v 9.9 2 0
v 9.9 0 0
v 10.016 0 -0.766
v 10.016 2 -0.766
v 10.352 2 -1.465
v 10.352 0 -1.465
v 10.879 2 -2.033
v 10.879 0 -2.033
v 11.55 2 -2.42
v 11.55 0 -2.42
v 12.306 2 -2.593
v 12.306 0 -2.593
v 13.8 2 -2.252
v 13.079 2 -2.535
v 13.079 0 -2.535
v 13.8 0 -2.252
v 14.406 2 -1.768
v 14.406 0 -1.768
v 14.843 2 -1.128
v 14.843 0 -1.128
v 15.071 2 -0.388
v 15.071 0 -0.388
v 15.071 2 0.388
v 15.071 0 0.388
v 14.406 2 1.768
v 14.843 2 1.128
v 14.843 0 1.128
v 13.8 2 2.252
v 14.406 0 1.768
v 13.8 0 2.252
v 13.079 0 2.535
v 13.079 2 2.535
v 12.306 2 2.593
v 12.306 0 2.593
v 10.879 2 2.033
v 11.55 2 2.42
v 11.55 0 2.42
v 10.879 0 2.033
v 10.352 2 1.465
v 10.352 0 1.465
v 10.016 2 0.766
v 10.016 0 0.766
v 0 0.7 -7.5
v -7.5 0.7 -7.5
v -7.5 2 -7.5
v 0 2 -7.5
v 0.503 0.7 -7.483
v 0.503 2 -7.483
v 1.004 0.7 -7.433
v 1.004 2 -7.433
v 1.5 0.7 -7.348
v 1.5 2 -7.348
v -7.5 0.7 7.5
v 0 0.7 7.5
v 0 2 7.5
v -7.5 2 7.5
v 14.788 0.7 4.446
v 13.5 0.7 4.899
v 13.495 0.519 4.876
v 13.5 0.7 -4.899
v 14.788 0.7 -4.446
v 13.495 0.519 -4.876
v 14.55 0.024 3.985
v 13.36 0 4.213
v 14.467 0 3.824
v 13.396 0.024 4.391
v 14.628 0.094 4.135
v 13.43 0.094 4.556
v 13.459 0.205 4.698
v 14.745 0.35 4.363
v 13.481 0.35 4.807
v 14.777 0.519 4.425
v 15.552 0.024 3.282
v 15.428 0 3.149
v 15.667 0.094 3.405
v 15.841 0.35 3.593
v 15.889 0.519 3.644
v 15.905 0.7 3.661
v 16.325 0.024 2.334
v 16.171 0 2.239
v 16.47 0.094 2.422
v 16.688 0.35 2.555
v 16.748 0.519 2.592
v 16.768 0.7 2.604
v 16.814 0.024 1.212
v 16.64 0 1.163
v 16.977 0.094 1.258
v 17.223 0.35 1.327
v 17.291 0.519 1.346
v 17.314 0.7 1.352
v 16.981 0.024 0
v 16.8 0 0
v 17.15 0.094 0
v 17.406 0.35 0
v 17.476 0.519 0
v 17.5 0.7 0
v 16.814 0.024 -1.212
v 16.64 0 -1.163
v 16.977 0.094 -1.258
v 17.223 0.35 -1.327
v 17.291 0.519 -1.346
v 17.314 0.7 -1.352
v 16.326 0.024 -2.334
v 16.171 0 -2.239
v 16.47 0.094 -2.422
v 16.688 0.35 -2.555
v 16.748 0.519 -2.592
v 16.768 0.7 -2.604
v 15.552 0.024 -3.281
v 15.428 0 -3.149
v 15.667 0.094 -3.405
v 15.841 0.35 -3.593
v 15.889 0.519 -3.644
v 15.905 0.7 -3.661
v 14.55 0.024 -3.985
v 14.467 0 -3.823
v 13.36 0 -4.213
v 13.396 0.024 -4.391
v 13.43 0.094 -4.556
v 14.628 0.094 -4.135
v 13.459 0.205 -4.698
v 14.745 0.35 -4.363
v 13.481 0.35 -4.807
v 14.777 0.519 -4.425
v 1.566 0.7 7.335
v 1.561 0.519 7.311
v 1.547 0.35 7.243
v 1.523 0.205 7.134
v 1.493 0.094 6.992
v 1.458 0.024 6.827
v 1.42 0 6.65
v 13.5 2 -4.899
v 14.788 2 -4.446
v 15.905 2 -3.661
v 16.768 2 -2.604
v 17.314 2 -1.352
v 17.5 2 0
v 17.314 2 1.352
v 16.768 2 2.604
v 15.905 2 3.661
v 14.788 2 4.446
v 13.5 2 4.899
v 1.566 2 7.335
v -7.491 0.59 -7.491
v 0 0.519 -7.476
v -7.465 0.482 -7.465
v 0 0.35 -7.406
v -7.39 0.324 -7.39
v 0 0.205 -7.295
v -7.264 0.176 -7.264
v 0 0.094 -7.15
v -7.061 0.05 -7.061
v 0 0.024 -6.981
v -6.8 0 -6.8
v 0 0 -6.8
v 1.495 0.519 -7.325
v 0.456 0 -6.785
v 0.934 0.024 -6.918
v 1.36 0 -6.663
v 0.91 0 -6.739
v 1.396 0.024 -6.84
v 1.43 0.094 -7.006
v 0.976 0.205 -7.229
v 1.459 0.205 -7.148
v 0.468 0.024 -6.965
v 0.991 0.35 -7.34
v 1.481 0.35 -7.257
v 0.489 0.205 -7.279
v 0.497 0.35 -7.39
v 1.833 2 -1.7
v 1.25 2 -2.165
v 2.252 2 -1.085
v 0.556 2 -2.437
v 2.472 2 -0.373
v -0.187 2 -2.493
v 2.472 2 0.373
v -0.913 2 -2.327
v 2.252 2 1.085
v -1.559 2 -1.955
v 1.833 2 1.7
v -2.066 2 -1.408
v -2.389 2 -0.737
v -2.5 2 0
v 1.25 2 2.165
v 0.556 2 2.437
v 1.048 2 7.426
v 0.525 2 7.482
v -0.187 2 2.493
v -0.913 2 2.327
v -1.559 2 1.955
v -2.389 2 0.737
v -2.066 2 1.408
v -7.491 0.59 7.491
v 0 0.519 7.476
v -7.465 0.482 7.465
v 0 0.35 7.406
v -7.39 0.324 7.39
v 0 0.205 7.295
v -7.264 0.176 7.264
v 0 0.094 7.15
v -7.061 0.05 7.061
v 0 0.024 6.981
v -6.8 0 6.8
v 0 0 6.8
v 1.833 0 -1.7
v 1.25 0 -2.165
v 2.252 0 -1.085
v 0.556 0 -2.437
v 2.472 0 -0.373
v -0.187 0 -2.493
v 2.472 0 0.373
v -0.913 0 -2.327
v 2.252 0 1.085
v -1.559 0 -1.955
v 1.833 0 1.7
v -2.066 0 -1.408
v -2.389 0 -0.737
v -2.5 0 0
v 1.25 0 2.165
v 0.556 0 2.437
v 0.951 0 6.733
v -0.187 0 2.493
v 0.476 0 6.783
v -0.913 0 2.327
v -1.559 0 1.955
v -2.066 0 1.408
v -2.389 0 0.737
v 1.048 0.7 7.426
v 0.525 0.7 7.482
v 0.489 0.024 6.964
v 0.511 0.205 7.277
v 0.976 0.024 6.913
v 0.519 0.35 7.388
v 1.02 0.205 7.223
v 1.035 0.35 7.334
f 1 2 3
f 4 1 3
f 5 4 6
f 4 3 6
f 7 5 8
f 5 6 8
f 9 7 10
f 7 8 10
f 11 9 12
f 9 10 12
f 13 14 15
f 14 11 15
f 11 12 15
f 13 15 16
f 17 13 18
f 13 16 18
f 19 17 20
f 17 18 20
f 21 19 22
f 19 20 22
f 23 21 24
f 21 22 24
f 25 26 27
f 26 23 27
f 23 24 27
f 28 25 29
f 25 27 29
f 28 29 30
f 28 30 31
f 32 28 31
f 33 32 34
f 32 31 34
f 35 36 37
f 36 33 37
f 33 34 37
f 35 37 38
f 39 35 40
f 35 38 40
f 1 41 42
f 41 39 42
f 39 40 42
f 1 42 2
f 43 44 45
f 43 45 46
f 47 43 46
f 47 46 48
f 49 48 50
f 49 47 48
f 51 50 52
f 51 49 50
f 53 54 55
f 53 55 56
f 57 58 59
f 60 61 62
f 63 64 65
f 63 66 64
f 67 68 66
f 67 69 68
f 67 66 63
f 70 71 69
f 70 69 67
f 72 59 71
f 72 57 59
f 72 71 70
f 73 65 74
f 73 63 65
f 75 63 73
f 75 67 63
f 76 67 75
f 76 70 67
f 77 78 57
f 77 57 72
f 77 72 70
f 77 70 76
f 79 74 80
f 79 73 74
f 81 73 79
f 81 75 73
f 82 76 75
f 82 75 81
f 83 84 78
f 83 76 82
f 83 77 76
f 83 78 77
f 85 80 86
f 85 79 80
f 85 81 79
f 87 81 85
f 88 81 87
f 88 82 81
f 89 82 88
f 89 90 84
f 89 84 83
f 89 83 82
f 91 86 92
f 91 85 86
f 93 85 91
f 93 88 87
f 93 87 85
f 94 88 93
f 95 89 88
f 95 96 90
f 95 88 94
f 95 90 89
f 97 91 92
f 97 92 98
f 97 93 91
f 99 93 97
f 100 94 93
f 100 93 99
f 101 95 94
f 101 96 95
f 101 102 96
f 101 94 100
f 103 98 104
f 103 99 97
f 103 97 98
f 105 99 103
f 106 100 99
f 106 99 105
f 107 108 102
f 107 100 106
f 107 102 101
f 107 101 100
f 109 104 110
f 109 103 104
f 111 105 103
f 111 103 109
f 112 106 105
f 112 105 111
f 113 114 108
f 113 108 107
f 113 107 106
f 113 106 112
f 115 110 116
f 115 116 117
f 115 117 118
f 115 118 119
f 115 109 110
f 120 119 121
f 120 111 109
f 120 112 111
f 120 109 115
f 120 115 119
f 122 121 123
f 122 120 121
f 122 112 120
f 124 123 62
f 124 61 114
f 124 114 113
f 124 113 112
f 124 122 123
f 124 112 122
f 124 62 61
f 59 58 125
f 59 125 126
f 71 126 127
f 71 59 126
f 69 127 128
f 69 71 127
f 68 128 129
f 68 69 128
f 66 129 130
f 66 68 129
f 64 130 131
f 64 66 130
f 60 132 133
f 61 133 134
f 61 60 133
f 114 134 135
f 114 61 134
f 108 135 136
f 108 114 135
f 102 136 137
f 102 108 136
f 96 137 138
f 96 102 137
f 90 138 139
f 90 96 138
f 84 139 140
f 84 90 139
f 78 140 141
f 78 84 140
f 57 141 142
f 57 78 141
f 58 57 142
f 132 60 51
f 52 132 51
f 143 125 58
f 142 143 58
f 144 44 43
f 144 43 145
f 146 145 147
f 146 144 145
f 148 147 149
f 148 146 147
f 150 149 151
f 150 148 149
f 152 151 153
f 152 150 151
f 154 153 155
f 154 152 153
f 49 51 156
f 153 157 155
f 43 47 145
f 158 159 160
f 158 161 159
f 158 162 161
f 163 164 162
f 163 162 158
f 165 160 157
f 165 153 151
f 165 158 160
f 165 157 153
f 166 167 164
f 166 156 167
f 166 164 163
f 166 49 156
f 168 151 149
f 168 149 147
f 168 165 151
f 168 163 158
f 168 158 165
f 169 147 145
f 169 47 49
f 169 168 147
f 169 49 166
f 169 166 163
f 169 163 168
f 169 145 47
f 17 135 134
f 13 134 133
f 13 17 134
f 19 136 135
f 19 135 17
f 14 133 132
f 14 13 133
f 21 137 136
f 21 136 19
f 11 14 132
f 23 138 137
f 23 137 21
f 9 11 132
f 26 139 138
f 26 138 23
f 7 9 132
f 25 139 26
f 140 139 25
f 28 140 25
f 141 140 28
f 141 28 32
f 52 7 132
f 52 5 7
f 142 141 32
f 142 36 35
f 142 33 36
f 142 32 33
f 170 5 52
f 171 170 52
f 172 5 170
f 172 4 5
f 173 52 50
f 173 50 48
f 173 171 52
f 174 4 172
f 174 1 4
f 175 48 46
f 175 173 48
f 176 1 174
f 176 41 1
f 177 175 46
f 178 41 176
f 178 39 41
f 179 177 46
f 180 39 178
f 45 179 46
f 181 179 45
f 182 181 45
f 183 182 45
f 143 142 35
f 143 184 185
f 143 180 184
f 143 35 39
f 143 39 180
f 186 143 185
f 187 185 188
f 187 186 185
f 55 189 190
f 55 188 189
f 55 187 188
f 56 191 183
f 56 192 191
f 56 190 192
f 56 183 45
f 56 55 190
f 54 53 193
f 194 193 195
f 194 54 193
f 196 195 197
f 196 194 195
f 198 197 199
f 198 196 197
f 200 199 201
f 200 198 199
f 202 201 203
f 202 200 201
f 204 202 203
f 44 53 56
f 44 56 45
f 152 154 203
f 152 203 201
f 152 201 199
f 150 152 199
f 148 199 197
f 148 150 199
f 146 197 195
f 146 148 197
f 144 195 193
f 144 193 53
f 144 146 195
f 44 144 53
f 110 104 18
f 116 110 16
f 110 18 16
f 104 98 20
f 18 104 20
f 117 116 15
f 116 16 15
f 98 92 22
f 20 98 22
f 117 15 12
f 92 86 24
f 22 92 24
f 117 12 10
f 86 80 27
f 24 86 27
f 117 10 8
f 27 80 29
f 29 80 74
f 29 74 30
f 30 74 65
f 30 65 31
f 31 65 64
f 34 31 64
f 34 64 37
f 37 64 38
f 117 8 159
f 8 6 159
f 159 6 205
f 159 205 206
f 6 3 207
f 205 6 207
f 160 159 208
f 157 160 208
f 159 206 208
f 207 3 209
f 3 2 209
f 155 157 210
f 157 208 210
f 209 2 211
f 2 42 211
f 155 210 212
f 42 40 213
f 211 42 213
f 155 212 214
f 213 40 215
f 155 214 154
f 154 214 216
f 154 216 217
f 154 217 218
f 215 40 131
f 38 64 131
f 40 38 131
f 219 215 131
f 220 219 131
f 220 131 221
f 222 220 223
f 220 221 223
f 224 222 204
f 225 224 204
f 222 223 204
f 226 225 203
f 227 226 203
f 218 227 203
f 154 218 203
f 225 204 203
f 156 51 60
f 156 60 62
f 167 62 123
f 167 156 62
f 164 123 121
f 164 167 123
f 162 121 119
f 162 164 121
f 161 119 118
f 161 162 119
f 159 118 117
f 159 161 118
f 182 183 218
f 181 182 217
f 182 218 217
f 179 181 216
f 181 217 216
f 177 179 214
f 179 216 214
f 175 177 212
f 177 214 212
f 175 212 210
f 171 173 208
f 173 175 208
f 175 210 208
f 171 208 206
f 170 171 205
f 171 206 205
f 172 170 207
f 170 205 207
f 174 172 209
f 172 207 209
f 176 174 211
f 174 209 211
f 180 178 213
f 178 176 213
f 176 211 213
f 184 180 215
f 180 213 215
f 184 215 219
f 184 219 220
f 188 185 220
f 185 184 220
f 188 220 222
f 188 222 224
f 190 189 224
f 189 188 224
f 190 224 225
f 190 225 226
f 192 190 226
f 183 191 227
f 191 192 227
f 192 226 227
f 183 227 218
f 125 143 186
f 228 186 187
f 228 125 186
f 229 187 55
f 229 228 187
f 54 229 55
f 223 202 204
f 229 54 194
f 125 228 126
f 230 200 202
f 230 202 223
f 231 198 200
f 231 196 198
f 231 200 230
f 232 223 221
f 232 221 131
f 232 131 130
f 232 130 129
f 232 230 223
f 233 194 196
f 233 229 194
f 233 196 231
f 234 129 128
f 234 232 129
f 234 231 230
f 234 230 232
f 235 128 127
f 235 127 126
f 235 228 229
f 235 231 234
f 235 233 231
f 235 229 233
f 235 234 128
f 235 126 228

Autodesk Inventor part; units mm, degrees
ref_plane "YZ Plane" through (0, 0, 0) normal (1, 0, 0) x (0, 1, 0)
ref_plane "XZ Plane" through (0, 0, 0) normal (0, 1, 0) x (-1, 0, 0)
ref_plane "XY Plane" through (0, 0, 0) normal (0, 0, 1) x (1, 0, 0)
sketch "Эскиз1" plane through (0, 0, 0) normal (0, 1, 0) x (-1, 0, 0)
  circle A0 centre (0, 0) radius 2.5
  circle A1 centre (0, 0) radius 7.5
  line L0 (0, 7.5) -> (7.5, 7.5)
  line L1 (7.5, 7.5) -> (7.5, -7.5)
  line L2 (7.5, -7.5) -> (0, -7.5)
  line L3 (0, -7.5) -> (0, 7.5)
  line L4 (-7.5, 0) -> (-12.5, 0)
  circle A2 centre (-12.5, 0) radius 2.6
  circle A3 centre (-12.5, 0) radius 5
  line L5 (-1.5661, 7.3347) -> (-13.4999, 4.899)
  line L6 (-13.5, -4.899) -> (-1.5, -7.3485)
  dimension "d0" = 5
  dimension "d1" = 15
  dimension "d2" = 5
  dimension "d3" = 5.2
extrude "Выдавливание1" add sketch "Эскиз1" along normal blind 2 contours A0 L3 A1 | A0 L3 A1 | L0 L1 A1 | A1 L1 L2 | A1 A3 L5 | L6 A3 A1 | A3
fillet "Сопряжение1" radius 0.7 8 edges at (0.7874, 0, 7.4586) (-3.75, 0, 7.5) (-7.5, 0, 0) (0.7538, 0, -7.462) (7.5, 0, -6.1237) (17.5, 0, 0.0001) (7.533, 0, 6.1168) (-3.75, 0, -7.5)
properties part number "block_02"
